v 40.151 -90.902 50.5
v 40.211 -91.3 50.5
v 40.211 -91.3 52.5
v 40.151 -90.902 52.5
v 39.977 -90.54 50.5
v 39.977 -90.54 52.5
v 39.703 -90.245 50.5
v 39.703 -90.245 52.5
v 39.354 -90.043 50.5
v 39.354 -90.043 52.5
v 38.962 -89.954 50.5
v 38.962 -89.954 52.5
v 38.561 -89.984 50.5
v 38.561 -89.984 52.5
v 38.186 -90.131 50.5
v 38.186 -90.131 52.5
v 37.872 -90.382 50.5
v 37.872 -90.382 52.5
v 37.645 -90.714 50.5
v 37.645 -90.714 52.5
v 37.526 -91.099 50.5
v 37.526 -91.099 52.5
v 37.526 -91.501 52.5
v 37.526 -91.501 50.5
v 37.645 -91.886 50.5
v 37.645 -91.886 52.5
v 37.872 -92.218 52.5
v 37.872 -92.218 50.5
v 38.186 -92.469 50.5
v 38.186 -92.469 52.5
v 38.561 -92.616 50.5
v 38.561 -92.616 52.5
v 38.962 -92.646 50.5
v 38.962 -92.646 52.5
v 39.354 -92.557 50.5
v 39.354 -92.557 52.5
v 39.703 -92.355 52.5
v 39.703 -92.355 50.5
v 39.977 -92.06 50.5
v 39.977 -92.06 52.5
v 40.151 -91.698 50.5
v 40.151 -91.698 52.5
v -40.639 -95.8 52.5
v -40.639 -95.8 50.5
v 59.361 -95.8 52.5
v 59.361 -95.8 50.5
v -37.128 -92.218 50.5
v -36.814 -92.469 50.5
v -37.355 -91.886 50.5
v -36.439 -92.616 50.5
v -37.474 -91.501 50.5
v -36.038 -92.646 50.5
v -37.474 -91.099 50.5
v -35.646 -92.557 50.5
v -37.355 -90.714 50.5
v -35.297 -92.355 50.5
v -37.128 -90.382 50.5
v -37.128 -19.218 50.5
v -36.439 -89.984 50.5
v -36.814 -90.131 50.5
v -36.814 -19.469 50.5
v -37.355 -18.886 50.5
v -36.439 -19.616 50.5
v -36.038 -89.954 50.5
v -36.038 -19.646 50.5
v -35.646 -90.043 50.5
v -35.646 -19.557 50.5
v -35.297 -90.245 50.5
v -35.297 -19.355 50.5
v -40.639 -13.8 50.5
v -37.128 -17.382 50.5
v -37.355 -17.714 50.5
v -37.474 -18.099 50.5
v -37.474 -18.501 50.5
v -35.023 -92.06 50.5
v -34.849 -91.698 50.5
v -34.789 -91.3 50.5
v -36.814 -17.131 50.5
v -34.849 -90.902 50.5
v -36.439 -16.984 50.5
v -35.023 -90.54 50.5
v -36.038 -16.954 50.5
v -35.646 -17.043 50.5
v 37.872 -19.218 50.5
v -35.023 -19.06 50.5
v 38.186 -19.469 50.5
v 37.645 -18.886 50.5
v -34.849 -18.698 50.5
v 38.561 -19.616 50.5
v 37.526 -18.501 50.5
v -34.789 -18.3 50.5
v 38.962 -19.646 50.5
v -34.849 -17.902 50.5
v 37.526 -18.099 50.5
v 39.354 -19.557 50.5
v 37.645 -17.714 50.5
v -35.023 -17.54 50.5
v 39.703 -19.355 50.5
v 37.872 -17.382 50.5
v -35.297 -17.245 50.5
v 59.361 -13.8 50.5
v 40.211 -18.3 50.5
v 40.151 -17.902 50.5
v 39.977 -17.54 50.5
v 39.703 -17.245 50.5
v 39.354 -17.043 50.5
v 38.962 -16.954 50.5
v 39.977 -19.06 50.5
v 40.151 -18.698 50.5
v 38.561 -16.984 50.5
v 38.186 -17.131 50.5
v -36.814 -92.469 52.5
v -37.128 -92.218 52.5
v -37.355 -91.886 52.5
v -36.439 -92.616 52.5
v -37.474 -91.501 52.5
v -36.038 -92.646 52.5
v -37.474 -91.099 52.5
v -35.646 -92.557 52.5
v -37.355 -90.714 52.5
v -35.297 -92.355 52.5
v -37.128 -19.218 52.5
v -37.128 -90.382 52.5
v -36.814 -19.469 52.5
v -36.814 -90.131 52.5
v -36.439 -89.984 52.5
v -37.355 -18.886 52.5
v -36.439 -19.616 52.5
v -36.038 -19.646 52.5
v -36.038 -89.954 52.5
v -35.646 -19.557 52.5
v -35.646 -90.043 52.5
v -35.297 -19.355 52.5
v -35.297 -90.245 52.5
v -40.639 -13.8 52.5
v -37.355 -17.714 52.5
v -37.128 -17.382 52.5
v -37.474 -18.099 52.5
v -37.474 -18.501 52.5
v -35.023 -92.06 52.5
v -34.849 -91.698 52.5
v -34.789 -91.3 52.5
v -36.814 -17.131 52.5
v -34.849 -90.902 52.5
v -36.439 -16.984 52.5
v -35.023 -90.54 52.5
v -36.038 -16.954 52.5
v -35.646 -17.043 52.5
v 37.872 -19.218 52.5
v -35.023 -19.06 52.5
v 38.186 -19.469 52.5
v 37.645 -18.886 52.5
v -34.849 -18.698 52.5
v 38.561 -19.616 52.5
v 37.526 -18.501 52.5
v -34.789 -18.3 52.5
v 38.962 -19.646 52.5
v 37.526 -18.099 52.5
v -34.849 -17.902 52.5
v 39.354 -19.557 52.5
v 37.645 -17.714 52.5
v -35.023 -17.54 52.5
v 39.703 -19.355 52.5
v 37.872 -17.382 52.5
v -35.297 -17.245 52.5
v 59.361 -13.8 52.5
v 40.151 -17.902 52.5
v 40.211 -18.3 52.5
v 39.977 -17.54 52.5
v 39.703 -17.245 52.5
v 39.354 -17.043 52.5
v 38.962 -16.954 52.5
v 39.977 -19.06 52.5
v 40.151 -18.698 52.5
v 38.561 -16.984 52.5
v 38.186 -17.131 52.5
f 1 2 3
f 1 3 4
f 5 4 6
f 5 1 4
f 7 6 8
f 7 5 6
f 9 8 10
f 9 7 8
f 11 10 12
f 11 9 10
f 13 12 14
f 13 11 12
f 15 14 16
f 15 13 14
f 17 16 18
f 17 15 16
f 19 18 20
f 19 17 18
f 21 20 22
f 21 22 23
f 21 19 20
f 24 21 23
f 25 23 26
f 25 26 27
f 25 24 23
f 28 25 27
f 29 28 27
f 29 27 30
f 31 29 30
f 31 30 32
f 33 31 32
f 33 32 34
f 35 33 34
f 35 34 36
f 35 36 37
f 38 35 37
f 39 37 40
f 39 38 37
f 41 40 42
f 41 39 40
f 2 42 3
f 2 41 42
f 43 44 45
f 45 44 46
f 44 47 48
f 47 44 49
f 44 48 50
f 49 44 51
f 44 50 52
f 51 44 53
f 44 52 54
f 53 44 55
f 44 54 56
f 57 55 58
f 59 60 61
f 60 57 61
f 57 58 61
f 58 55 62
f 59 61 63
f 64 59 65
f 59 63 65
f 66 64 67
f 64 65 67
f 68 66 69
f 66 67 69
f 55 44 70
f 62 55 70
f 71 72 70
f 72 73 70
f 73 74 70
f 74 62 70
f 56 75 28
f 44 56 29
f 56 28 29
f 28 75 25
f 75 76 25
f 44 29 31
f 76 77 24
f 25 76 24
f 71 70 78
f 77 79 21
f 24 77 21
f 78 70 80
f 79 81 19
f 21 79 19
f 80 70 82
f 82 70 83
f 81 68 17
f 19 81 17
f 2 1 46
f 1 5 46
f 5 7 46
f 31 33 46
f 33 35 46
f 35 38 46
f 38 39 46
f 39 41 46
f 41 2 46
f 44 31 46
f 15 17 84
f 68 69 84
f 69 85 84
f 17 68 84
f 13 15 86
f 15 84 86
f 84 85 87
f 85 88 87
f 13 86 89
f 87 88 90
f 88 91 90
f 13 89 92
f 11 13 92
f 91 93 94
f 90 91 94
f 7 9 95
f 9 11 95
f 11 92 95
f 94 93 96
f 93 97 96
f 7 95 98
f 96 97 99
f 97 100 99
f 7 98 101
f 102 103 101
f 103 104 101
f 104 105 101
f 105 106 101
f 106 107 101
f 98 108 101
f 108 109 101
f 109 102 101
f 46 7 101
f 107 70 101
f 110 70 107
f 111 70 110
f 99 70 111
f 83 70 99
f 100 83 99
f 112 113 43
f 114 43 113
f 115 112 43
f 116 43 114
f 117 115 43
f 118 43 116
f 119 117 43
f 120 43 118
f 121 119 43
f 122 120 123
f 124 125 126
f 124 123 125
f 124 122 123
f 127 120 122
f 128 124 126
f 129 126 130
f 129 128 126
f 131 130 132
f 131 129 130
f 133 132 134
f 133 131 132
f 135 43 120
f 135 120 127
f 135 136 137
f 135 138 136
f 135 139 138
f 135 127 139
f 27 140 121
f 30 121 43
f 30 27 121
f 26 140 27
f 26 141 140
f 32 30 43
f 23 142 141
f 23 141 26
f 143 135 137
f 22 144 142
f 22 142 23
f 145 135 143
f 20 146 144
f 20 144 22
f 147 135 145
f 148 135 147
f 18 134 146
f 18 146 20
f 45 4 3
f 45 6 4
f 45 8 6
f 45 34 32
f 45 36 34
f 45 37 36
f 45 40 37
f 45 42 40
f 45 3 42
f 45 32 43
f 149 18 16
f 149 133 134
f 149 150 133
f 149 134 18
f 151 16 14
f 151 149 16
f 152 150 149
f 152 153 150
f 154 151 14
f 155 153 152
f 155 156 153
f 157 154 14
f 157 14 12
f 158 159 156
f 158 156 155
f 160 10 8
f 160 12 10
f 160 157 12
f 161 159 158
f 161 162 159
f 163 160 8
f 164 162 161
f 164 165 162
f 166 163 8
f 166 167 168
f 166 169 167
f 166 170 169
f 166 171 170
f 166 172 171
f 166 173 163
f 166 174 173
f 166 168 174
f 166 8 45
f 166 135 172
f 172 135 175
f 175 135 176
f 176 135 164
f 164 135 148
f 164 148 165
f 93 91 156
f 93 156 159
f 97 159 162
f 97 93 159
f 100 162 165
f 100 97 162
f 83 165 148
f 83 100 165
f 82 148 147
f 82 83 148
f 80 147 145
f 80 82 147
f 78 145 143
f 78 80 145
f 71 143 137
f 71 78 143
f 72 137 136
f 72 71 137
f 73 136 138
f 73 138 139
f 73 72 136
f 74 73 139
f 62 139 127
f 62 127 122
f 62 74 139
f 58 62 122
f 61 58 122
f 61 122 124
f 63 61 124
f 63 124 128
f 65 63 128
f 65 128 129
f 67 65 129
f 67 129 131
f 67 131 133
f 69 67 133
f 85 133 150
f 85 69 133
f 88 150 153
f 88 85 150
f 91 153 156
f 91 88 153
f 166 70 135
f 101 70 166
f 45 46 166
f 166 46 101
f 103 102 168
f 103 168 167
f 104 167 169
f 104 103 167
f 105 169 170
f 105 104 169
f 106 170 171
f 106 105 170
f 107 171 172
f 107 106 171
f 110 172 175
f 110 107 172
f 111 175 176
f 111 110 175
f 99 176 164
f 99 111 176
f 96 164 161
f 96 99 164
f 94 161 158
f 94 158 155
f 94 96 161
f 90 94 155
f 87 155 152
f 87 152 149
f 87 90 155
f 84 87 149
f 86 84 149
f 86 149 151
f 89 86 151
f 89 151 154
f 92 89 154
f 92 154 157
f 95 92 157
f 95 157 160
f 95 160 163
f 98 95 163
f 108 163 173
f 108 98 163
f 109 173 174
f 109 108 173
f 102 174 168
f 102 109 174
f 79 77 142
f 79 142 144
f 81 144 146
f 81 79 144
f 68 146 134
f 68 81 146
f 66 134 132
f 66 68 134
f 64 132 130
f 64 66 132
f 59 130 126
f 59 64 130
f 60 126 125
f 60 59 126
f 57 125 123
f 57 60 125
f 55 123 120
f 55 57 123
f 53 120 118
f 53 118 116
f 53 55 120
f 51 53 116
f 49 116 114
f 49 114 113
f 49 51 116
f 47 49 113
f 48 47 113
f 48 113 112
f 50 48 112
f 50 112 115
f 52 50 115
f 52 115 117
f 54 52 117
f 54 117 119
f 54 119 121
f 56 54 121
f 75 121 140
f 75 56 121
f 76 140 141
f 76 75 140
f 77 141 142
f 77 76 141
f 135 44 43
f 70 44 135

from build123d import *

# Parameters (mm, degrees)
ESQUISSE1_W        = 100
ESQUISSE1_H        = 82
ESQUISSE1_R        = 1.35
BOSS_EXTRU_1_DEPTH = 2


with BuildPart() as part:
    # Esquisse1 → Boss.-Extru.1 (new body)
    with BuildSketch(Plane.XY.offset(50.5)):
        with Locations((9.361165235, -54.8)):
            Rectangle(ESQUISSE1_W, ESQUISSE1_H)
        with Locations((-36.138834765, -91.3)):
            Circle(ESQUISSE1_R, mode=Mode.SUBTRACT)
        with Locations((-36.138834765, -18.3)):
            Circle(ESQUISSE1_R, mode=Mode.SUBTRACT)
        with Locations((38.861165235, -91.3)):
            Circle(ESQUISSE1_R, mode=Mode.SUBTRACT)
        with Locations((38.861165235, -18.3)):
            Circle(ESQUISSE1_R, mode=Mode.SUBTRACT)
    extrude(amount=BOSS_EXTRU_1_DEPTH)


solid = part.part
